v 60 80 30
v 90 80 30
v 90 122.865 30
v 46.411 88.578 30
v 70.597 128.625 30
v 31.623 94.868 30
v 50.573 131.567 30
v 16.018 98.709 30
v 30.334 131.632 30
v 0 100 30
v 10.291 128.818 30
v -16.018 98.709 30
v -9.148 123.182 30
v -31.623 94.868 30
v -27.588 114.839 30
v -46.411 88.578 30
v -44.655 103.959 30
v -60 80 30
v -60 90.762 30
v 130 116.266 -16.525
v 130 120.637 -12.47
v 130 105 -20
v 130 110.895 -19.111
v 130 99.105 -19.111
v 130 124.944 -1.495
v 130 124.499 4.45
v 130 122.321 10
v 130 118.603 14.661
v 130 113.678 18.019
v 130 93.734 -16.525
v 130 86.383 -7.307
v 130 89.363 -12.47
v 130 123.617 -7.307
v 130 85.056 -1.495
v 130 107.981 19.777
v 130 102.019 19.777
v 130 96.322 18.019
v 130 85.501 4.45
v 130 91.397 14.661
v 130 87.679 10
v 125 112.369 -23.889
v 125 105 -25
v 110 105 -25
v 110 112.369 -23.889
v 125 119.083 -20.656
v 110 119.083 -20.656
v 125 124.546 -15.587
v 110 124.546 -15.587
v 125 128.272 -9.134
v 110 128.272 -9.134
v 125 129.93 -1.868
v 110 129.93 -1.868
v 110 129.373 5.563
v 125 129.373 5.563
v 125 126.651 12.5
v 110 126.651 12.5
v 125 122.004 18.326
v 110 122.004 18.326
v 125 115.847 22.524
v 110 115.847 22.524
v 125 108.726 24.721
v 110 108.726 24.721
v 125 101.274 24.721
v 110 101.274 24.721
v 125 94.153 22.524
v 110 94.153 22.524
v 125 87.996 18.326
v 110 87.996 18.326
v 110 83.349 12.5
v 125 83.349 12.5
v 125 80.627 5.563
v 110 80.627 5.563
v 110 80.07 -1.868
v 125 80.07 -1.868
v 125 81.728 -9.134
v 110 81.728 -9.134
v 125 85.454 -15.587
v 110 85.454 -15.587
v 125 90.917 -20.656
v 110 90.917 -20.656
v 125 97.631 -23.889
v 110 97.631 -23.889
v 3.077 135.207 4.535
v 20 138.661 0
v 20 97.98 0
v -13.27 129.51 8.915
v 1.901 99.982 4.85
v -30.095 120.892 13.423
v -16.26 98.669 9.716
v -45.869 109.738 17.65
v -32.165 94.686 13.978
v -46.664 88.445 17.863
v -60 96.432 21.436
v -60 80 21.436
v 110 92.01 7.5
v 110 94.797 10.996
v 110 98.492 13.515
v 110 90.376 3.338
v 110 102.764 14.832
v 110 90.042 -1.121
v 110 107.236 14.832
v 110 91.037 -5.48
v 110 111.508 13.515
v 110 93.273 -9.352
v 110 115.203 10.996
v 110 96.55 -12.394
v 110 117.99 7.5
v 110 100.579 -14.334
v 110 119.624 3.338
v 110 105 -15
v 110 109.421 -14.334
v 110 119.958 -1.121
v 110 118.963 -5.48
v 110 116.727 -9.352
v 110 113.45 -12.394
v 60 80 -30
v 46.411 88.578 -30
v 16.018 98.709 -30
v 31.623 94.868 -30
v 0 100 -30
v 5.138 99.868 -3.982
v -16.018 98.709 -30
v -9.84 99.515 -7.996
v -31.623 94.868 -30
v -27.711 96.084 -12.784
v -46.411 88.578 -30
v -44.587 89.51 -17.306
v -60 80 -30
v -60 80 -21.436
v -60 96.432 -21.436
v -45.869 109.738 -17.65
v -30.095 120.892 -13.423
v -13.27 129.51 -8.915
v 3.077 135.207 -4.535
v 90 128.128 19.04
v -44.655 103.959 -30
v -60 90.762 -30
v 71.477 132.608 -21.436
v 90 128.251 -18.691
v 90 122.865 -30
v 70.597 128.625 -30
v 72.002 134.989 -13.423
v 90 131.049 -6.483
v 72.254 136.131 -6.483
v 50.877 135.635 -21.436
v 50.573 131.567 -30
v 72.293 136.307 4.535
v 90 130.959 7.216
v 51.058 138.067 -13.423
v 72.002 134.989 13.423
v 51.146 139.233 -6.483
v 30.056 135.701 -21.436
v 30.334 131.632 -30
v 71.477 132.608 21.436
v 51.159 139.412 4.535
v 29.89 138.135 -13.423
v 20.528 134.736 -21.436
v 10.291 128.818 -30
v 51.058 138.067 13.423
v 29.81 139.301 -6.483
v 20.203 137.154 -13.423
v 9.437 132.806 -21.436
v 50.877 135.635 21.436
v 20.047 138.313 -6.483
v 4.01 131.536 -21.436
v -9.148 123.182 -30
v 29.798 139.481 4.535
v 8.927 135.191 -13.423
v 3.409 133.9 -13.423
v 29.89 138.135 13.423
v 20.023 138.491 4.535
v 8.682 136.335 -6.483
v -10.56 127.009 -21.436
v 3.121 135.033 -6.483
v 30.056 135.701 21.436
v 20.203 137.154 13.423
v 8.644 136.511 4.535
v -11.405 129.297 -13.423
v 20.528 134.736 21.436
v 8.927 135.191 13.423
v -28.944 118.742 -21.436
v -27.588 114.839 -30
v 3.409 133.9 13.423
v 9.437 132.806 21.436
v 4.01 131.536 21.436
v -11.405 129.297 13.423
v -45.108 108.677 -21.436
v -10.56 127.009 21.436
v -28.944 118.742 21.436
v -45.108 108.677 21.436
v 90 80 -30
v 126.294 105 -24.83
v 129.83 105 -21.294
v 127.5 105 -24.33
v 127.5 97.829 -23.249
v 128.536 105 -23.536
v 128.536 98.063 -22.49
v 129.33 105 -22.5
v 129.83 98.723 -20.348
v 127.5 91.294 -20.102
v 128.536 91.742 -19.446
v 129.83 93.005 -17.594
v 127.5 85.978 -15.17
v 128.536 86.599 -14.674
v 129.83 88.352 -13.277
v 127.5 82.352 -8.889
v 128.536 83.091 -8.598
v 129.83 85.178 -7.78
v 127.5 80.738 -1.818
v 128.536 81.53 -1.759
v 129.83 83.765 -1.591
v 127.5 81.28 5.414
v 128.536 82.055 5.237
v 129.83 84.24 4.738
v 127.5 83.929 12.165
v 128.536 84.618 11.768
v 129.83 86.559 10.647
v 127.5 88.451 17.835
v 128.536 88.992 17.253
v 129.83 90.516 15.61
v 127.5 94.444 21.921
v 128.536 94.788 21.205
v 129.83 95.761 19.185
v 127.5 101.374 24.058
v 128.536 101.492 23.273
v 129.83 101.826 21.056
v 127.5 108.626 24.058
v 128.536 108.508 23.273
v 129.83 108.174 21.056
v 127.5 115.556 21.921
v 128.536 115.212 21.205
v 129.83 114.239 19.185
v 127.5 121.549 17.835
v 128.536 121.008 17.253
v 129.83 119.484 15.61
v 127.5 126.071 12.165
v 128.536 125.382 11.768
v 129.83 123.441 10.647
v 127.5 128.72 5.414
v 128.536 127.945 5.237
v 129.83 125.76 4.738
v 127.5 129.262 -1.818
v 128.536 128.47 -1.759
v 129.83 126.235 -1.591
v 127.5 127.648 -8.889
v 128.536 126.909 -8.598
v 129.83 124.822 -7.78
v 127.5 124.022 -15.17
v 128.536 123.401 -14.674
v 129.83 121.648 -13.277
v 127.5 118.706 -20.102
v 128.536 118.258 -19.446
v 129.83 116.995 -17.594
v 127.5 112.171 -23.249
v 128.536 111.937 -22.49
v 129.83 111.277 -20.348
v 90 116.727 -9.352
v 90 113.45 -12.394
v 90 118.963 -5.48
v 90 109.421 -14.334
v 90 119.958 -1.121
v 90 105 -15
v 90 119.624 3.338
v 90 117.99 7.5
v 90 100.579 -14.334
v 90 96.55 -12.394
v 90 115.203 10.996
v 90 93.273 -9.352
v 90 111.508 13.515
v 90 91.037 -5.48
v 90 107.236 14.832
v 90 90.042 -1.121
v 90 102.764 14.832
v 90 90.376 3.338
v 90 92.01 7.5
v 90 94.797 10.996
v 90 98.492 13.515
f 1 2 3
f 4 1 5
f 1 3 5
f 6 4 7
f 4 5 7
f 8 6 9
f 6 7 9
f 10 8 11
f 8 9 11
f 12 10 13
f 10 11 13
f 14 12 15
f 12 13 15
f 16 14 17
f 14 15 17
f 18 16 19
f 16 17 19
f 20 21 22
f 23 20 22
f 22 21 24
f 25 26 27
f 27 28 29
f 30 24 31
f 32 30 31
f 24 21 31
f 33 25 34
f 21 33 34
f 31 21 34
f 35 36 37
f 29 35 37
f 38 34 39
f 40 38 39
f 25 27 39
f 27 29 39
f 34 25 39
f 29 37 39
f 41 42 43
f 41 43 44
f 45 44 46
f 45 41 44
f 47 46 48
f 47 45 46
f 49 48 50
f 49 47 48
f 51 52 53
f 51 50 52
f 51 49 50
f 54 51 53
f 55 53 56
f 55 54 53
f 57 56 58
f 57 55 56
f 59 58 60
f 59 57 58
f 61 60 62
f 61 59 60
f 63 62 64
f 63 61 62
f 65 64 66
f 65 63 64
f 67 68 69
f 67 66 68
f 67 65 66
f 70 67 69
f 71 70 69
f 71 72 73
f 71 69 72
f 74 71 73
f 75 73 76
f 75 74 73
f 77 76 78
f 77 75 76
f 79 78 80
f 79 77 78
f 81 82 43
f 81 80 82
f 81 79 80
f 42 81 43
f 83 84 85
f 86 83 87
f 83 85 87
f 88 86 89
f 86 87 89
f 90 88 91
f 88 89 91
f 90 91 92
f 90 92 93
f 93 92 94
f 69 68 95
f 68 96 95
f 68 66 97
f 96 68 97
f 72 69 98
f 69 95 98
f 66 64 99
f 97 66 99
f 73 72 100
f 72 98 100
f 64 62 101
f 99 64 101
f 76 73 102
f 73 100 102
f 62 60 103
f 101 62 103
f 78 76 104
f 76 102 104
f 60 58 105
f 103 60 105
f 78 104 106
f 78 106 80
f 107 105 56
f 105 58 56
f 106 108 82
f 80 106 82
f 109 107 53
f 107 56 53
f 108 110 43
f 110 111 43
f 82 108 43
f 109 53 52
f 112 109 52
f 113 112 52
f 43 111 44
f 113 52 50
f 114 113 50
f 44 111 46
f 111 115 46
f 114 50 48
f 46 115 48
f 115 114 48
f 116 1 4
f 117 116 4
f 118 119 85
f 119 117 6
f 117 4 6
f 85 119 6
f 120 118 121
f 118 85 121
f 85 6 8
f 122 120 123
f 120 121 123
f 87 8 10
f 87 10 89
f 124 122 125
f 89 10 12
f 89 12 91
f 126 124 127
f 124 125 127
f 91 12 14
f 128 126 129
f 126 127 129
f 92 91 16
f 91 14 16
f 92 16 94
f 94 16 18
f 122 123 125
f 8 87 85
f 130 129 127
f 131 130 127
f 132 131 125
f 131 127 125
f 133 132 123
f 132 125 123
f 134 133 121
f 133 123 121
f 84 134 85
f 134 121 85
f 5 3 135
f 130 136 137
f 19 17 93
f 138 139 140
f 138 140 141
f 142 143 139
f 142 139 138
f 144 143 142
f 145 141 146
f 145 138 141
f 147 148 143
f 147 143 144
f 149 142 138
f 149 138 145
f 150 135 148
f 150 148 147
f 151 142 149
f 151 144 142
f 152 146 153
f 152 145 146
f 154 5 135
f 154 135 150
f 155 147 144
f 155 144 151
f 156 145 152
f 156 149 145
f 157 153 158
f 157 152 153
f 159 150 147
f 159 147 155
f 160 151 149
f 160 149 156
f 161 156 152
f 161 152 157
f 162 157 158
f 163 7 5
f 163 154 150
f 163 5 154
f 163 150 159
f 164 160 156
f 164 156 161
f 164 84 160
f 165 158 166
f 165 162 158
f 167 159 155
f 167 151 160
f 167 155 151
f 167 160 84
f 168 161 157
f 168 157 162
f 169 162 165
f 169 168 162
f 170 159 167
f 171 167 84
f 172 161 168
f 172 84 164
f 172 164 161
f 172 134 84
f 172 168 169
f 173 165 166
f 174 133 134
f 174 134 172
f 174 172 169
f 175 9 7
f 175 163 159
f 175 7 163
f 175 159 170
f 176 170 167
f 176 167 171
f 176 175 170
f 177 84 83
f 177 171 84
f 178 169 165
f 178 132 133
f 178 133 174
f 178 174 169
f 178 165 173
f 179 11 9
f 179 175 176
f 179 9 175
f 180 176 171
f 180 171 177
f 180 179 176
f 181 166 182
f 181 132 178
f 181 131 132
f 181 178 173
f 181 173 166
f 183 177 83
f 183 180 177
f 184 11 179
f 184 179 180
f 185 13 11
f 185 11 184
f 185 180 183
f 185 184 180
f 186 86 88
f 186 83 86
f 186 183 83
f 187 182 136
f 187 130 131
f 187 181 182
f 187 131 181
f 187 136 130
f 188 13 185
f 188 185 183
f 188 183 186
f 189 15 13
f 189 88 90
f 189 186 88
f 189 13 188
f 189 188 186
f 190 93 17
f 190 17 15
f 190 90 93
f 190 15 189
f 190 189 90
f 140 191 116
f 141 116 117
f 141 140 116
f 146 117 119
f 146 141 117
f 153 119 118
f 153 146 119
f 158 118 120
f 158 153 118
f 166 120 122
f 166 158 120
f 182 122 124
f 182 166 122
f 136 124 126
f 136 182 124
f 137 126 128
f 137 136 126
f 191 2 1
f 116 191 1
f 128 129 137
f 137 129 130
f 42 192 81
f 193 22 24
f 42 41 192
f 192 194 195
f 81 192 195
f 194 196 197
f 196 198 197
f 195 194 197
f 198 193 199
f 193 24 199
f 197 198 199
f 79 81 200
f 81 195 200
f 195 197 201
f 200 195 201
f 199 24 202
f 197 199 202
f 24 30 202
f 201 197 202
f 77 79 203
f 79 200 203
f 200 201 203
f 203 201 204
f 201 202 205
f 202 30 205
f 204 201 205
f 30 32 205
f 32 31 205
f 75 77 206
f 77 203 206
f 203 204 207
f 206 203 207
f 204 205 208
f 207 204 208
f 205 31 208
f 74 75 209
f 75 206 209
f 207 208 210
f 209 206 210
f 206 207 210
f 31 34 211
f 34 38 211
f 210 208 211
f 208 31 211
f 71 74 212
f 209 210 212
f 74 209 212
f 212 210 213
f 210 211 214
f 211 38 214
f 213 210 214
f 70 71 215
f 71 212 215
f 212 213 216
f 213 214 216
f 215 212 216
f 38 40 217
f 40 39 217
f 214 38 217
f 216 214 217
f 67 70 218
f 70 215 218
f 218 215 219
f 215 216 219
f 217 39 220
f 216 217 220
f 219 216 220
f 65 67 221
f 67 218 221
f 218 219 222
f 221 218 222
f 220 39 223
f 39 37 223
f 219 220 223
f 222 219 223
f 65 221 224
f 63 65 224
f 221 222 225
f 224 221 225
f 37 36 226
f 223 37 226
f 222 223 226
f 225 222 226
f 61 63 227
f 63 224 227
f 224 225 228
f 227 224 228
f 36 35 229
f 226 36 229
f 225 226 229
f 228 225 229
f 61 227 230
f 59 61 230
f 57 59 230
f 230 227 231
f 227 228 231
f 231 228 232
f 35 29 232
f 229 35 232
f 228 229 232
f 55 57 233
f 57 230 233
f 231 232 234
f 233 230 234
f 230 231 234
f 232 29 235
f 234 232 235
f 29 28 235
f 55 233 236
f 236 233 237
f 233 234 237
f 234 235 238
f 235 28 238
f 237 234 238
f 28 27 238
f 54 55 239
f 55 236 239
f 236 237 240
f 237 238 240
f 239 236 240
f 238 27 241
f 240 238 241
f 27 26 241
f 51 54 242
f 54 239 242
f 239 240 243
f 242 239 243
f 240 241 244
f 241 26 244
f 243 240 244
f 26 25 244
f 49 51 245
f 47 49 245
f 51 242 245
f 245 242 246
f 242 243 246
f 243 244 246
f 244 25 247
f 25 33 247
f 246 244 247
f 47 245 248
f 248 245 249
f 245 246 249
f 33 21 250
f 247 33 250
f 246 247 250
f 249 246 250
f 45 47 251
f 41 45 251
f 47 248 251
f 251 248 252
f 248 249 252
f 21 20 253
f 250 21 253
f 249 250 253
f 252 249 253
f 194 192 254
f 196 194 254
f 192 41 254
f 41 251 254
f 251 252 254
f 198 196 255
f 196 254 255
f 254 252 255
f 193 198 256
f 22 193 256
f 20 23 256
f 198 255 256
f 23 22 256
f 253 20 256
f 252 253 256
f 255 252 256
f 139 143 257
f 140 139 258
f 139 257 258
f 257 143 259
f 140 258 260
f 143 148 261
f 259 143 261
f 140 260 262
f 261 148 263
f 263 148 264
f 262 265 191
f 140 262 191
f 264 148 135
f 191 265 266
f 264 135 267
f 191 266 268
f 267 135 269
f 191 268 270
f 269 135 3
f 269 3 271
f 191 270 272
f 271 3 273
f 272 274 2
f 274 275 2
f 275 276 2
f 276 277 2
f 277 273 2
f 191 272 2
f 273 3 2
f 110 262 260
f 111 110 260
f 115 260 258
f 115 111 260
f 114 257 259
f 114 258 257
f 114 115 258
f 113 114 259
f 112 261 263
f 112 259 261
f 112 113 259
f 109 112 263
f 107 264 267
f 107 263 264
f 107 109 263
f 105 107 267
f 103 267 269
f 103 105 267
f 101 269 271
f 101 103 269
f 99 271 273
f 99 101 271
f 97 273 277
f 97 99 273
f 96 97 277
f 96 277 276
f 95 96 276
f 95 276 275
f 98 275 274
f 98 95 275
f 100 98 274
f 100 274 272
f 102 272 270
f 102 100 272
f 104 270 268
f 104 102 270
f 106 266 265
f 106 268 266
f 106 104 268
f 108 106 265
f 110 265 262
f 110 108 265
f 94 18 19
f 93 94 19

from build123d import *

# Parameters (mm, degrees)
BOSS_EXTRUDE1_DEPTH     = 30
SKETCH3_OUTSIDE_W       = 103.618
SKETCH3_OUTSIDE_H       = 103.618
SKETCH3_OUTSIDE_R       = 25
CUT_EXTRUDE1_DEPTH      = 40
CUT_EXTRUDE2_START      = -20
SKETCH4_OUTSIDE_W       = 103.618
SKETCH4_OUTSIDE_H       = 103.618
SKETCH4_OUTSIDE_R       = 15
CUT_EXTRUDE2_DEPTH      = 20
FILLET1_R               = 5
CUT_EXTRUDE3_REACH      = 148.287
CUT_EXTRUDE3_END_RADIUS = 150


with BuildPart() as part:
    # Sketch2 → Boss-Extrude1 (new, symmetric)
    with BuildSketch(Plane.XY):
        with BuildLine():
            Line((-60, 80), (-60, 101.803398875))
            ThreePointArc((-60, 101.803398875), (10.943058496, 137.158737934), (90, 131.421356237))
            Line((90, 131.421356237), (90, 120))
            Line((90, 120), (110, 120))
            Line((110, 120), (110, 130))
            Line((110, 130), (130, 130))
            Line((130, 130), (130, 80))
            Line((130, 80), (110, 80))
            Line((110, 80), (110, 90))
            Line((110, 90), (90, 90))
            Line((90, 90), (90, 80))
            Line((90, 80), (60, 80))
            ThreePointArc((60, 80), (0, 100), (-60, 80))
        make_face()
    extrude(amount=BOSS_EXTRUDE1_DEPTH, both=True)

    # Sketch3 outside → Cut-Extrude1 (cut)
    with BuildSketch(Plane(origin=(130, 0, 0), x_dir=(0, 0, -1), z_dir=(1, 0, 0))):
        with Locations((0, 110)):
            Rectangle(SKETCH3_OUTSIDE_W, SKETCH3_OUTSIDE_H)
        with Locations((0, 105)):
            Circle(SKETCH3_OUTSIDE_R, mode=Mode.SUBTRACT)
    extrude(amount=-CUT_EXTRUDE1_DEPTH, mode=Mode.SUBTRACT)

    # Sketch4 outside → Cut-Extrude2 (cut)
    with BuildSketch(Plane(origin=(130, 0, 0), x_dir=(0, 0, -1), z_dir=(1, 0, 0)).offset(CUT_EXTRUDE2_START)):
        with Locations((0, 110)):
            Rectangle(SKETCH4_OUTSIDE_W, SKETCH4_OUTSIDE_H)
        with Locations((0, 105)):
            Circle(SKETCH4_OUTSIDE_R, mode=Mode.SUBTRACT)
    extrude(amount=-CUT_EXTRUDE2_DEPTH, mode=Mode.SUBTRACT)

    # Fillet1
    fillet1_edges = [part.edges().sort_by_distance(p)[0] for p in [
        (130, 105, 25),
    ]]
    fillet(fillet1_edges, radius=FILLET1_R)

    # Cut-Extrude3: up to this cylinder (the profile starts inside it)
    cut_extrude3_end = Plane(origin=(40, -10, 0), z_dir=(0, 0, -1)) * Cylinder(CUT_EXTRUDE3_END_RADIUS, 597.574, mode=Mode.PRIVATE)
    # Sketch5 → Cut-Extrude3 (cut, up to the surface)
    with BuildSketch(Plane.XZ.offset(-80), mode=Mode.PRIVATE) as cut_extrude3_sk1:
        Polygon((20, 0), (-60, 21.435935394), (-60, -21.435935394), align=None)
    cut_extrude3_tool1 = extrude(cut_extrude3_sk1.sketch, amount=-CUT_EXTRUDE3_REACH, mode=Mode.PRIVATE) & cut_extrude3_end
    add(cut_extrude3_tool1.solids().sort_by_distance((-33.333333, 80, 0))[0], mode=Mode.SUBTRACT)

    # SurfaceCut4: cut with a surface, the side it looks to stays
    # Surface-Sweep1: a surface, the sketch's curves swept along a path
    with BuildLine(Plane(origin=(40, 0, 0), x_dir=(0, 0, -1), z_dir=(1, 0, 0)), mode=Mode.PRIVATE) as surface_sweep1_1_profile:
        Line((0, 20), (0, 80))
        Line((0, 80), (60, 80))
        ThreePointArc((60, 80), (-42.426406871, 122.426406871), (0, 20))
    with BuildLine(Plane.XY, mode=Mode.PRIVATE) as surface_sweep1_1_along:
        ThreePointArc((104.347571597, 125.49682664), (-0.649478186, 134.387049015), (-85.586612969, 72.024402728))
    surface_sweep1_1 = Shell.sweep(surface_sweep1_1_profile.wire(), surface_sweep1_1_along.wire())
    split(bisect_by=surface_sweep1_1, keep=Keep.TOP)


solid = part.part
